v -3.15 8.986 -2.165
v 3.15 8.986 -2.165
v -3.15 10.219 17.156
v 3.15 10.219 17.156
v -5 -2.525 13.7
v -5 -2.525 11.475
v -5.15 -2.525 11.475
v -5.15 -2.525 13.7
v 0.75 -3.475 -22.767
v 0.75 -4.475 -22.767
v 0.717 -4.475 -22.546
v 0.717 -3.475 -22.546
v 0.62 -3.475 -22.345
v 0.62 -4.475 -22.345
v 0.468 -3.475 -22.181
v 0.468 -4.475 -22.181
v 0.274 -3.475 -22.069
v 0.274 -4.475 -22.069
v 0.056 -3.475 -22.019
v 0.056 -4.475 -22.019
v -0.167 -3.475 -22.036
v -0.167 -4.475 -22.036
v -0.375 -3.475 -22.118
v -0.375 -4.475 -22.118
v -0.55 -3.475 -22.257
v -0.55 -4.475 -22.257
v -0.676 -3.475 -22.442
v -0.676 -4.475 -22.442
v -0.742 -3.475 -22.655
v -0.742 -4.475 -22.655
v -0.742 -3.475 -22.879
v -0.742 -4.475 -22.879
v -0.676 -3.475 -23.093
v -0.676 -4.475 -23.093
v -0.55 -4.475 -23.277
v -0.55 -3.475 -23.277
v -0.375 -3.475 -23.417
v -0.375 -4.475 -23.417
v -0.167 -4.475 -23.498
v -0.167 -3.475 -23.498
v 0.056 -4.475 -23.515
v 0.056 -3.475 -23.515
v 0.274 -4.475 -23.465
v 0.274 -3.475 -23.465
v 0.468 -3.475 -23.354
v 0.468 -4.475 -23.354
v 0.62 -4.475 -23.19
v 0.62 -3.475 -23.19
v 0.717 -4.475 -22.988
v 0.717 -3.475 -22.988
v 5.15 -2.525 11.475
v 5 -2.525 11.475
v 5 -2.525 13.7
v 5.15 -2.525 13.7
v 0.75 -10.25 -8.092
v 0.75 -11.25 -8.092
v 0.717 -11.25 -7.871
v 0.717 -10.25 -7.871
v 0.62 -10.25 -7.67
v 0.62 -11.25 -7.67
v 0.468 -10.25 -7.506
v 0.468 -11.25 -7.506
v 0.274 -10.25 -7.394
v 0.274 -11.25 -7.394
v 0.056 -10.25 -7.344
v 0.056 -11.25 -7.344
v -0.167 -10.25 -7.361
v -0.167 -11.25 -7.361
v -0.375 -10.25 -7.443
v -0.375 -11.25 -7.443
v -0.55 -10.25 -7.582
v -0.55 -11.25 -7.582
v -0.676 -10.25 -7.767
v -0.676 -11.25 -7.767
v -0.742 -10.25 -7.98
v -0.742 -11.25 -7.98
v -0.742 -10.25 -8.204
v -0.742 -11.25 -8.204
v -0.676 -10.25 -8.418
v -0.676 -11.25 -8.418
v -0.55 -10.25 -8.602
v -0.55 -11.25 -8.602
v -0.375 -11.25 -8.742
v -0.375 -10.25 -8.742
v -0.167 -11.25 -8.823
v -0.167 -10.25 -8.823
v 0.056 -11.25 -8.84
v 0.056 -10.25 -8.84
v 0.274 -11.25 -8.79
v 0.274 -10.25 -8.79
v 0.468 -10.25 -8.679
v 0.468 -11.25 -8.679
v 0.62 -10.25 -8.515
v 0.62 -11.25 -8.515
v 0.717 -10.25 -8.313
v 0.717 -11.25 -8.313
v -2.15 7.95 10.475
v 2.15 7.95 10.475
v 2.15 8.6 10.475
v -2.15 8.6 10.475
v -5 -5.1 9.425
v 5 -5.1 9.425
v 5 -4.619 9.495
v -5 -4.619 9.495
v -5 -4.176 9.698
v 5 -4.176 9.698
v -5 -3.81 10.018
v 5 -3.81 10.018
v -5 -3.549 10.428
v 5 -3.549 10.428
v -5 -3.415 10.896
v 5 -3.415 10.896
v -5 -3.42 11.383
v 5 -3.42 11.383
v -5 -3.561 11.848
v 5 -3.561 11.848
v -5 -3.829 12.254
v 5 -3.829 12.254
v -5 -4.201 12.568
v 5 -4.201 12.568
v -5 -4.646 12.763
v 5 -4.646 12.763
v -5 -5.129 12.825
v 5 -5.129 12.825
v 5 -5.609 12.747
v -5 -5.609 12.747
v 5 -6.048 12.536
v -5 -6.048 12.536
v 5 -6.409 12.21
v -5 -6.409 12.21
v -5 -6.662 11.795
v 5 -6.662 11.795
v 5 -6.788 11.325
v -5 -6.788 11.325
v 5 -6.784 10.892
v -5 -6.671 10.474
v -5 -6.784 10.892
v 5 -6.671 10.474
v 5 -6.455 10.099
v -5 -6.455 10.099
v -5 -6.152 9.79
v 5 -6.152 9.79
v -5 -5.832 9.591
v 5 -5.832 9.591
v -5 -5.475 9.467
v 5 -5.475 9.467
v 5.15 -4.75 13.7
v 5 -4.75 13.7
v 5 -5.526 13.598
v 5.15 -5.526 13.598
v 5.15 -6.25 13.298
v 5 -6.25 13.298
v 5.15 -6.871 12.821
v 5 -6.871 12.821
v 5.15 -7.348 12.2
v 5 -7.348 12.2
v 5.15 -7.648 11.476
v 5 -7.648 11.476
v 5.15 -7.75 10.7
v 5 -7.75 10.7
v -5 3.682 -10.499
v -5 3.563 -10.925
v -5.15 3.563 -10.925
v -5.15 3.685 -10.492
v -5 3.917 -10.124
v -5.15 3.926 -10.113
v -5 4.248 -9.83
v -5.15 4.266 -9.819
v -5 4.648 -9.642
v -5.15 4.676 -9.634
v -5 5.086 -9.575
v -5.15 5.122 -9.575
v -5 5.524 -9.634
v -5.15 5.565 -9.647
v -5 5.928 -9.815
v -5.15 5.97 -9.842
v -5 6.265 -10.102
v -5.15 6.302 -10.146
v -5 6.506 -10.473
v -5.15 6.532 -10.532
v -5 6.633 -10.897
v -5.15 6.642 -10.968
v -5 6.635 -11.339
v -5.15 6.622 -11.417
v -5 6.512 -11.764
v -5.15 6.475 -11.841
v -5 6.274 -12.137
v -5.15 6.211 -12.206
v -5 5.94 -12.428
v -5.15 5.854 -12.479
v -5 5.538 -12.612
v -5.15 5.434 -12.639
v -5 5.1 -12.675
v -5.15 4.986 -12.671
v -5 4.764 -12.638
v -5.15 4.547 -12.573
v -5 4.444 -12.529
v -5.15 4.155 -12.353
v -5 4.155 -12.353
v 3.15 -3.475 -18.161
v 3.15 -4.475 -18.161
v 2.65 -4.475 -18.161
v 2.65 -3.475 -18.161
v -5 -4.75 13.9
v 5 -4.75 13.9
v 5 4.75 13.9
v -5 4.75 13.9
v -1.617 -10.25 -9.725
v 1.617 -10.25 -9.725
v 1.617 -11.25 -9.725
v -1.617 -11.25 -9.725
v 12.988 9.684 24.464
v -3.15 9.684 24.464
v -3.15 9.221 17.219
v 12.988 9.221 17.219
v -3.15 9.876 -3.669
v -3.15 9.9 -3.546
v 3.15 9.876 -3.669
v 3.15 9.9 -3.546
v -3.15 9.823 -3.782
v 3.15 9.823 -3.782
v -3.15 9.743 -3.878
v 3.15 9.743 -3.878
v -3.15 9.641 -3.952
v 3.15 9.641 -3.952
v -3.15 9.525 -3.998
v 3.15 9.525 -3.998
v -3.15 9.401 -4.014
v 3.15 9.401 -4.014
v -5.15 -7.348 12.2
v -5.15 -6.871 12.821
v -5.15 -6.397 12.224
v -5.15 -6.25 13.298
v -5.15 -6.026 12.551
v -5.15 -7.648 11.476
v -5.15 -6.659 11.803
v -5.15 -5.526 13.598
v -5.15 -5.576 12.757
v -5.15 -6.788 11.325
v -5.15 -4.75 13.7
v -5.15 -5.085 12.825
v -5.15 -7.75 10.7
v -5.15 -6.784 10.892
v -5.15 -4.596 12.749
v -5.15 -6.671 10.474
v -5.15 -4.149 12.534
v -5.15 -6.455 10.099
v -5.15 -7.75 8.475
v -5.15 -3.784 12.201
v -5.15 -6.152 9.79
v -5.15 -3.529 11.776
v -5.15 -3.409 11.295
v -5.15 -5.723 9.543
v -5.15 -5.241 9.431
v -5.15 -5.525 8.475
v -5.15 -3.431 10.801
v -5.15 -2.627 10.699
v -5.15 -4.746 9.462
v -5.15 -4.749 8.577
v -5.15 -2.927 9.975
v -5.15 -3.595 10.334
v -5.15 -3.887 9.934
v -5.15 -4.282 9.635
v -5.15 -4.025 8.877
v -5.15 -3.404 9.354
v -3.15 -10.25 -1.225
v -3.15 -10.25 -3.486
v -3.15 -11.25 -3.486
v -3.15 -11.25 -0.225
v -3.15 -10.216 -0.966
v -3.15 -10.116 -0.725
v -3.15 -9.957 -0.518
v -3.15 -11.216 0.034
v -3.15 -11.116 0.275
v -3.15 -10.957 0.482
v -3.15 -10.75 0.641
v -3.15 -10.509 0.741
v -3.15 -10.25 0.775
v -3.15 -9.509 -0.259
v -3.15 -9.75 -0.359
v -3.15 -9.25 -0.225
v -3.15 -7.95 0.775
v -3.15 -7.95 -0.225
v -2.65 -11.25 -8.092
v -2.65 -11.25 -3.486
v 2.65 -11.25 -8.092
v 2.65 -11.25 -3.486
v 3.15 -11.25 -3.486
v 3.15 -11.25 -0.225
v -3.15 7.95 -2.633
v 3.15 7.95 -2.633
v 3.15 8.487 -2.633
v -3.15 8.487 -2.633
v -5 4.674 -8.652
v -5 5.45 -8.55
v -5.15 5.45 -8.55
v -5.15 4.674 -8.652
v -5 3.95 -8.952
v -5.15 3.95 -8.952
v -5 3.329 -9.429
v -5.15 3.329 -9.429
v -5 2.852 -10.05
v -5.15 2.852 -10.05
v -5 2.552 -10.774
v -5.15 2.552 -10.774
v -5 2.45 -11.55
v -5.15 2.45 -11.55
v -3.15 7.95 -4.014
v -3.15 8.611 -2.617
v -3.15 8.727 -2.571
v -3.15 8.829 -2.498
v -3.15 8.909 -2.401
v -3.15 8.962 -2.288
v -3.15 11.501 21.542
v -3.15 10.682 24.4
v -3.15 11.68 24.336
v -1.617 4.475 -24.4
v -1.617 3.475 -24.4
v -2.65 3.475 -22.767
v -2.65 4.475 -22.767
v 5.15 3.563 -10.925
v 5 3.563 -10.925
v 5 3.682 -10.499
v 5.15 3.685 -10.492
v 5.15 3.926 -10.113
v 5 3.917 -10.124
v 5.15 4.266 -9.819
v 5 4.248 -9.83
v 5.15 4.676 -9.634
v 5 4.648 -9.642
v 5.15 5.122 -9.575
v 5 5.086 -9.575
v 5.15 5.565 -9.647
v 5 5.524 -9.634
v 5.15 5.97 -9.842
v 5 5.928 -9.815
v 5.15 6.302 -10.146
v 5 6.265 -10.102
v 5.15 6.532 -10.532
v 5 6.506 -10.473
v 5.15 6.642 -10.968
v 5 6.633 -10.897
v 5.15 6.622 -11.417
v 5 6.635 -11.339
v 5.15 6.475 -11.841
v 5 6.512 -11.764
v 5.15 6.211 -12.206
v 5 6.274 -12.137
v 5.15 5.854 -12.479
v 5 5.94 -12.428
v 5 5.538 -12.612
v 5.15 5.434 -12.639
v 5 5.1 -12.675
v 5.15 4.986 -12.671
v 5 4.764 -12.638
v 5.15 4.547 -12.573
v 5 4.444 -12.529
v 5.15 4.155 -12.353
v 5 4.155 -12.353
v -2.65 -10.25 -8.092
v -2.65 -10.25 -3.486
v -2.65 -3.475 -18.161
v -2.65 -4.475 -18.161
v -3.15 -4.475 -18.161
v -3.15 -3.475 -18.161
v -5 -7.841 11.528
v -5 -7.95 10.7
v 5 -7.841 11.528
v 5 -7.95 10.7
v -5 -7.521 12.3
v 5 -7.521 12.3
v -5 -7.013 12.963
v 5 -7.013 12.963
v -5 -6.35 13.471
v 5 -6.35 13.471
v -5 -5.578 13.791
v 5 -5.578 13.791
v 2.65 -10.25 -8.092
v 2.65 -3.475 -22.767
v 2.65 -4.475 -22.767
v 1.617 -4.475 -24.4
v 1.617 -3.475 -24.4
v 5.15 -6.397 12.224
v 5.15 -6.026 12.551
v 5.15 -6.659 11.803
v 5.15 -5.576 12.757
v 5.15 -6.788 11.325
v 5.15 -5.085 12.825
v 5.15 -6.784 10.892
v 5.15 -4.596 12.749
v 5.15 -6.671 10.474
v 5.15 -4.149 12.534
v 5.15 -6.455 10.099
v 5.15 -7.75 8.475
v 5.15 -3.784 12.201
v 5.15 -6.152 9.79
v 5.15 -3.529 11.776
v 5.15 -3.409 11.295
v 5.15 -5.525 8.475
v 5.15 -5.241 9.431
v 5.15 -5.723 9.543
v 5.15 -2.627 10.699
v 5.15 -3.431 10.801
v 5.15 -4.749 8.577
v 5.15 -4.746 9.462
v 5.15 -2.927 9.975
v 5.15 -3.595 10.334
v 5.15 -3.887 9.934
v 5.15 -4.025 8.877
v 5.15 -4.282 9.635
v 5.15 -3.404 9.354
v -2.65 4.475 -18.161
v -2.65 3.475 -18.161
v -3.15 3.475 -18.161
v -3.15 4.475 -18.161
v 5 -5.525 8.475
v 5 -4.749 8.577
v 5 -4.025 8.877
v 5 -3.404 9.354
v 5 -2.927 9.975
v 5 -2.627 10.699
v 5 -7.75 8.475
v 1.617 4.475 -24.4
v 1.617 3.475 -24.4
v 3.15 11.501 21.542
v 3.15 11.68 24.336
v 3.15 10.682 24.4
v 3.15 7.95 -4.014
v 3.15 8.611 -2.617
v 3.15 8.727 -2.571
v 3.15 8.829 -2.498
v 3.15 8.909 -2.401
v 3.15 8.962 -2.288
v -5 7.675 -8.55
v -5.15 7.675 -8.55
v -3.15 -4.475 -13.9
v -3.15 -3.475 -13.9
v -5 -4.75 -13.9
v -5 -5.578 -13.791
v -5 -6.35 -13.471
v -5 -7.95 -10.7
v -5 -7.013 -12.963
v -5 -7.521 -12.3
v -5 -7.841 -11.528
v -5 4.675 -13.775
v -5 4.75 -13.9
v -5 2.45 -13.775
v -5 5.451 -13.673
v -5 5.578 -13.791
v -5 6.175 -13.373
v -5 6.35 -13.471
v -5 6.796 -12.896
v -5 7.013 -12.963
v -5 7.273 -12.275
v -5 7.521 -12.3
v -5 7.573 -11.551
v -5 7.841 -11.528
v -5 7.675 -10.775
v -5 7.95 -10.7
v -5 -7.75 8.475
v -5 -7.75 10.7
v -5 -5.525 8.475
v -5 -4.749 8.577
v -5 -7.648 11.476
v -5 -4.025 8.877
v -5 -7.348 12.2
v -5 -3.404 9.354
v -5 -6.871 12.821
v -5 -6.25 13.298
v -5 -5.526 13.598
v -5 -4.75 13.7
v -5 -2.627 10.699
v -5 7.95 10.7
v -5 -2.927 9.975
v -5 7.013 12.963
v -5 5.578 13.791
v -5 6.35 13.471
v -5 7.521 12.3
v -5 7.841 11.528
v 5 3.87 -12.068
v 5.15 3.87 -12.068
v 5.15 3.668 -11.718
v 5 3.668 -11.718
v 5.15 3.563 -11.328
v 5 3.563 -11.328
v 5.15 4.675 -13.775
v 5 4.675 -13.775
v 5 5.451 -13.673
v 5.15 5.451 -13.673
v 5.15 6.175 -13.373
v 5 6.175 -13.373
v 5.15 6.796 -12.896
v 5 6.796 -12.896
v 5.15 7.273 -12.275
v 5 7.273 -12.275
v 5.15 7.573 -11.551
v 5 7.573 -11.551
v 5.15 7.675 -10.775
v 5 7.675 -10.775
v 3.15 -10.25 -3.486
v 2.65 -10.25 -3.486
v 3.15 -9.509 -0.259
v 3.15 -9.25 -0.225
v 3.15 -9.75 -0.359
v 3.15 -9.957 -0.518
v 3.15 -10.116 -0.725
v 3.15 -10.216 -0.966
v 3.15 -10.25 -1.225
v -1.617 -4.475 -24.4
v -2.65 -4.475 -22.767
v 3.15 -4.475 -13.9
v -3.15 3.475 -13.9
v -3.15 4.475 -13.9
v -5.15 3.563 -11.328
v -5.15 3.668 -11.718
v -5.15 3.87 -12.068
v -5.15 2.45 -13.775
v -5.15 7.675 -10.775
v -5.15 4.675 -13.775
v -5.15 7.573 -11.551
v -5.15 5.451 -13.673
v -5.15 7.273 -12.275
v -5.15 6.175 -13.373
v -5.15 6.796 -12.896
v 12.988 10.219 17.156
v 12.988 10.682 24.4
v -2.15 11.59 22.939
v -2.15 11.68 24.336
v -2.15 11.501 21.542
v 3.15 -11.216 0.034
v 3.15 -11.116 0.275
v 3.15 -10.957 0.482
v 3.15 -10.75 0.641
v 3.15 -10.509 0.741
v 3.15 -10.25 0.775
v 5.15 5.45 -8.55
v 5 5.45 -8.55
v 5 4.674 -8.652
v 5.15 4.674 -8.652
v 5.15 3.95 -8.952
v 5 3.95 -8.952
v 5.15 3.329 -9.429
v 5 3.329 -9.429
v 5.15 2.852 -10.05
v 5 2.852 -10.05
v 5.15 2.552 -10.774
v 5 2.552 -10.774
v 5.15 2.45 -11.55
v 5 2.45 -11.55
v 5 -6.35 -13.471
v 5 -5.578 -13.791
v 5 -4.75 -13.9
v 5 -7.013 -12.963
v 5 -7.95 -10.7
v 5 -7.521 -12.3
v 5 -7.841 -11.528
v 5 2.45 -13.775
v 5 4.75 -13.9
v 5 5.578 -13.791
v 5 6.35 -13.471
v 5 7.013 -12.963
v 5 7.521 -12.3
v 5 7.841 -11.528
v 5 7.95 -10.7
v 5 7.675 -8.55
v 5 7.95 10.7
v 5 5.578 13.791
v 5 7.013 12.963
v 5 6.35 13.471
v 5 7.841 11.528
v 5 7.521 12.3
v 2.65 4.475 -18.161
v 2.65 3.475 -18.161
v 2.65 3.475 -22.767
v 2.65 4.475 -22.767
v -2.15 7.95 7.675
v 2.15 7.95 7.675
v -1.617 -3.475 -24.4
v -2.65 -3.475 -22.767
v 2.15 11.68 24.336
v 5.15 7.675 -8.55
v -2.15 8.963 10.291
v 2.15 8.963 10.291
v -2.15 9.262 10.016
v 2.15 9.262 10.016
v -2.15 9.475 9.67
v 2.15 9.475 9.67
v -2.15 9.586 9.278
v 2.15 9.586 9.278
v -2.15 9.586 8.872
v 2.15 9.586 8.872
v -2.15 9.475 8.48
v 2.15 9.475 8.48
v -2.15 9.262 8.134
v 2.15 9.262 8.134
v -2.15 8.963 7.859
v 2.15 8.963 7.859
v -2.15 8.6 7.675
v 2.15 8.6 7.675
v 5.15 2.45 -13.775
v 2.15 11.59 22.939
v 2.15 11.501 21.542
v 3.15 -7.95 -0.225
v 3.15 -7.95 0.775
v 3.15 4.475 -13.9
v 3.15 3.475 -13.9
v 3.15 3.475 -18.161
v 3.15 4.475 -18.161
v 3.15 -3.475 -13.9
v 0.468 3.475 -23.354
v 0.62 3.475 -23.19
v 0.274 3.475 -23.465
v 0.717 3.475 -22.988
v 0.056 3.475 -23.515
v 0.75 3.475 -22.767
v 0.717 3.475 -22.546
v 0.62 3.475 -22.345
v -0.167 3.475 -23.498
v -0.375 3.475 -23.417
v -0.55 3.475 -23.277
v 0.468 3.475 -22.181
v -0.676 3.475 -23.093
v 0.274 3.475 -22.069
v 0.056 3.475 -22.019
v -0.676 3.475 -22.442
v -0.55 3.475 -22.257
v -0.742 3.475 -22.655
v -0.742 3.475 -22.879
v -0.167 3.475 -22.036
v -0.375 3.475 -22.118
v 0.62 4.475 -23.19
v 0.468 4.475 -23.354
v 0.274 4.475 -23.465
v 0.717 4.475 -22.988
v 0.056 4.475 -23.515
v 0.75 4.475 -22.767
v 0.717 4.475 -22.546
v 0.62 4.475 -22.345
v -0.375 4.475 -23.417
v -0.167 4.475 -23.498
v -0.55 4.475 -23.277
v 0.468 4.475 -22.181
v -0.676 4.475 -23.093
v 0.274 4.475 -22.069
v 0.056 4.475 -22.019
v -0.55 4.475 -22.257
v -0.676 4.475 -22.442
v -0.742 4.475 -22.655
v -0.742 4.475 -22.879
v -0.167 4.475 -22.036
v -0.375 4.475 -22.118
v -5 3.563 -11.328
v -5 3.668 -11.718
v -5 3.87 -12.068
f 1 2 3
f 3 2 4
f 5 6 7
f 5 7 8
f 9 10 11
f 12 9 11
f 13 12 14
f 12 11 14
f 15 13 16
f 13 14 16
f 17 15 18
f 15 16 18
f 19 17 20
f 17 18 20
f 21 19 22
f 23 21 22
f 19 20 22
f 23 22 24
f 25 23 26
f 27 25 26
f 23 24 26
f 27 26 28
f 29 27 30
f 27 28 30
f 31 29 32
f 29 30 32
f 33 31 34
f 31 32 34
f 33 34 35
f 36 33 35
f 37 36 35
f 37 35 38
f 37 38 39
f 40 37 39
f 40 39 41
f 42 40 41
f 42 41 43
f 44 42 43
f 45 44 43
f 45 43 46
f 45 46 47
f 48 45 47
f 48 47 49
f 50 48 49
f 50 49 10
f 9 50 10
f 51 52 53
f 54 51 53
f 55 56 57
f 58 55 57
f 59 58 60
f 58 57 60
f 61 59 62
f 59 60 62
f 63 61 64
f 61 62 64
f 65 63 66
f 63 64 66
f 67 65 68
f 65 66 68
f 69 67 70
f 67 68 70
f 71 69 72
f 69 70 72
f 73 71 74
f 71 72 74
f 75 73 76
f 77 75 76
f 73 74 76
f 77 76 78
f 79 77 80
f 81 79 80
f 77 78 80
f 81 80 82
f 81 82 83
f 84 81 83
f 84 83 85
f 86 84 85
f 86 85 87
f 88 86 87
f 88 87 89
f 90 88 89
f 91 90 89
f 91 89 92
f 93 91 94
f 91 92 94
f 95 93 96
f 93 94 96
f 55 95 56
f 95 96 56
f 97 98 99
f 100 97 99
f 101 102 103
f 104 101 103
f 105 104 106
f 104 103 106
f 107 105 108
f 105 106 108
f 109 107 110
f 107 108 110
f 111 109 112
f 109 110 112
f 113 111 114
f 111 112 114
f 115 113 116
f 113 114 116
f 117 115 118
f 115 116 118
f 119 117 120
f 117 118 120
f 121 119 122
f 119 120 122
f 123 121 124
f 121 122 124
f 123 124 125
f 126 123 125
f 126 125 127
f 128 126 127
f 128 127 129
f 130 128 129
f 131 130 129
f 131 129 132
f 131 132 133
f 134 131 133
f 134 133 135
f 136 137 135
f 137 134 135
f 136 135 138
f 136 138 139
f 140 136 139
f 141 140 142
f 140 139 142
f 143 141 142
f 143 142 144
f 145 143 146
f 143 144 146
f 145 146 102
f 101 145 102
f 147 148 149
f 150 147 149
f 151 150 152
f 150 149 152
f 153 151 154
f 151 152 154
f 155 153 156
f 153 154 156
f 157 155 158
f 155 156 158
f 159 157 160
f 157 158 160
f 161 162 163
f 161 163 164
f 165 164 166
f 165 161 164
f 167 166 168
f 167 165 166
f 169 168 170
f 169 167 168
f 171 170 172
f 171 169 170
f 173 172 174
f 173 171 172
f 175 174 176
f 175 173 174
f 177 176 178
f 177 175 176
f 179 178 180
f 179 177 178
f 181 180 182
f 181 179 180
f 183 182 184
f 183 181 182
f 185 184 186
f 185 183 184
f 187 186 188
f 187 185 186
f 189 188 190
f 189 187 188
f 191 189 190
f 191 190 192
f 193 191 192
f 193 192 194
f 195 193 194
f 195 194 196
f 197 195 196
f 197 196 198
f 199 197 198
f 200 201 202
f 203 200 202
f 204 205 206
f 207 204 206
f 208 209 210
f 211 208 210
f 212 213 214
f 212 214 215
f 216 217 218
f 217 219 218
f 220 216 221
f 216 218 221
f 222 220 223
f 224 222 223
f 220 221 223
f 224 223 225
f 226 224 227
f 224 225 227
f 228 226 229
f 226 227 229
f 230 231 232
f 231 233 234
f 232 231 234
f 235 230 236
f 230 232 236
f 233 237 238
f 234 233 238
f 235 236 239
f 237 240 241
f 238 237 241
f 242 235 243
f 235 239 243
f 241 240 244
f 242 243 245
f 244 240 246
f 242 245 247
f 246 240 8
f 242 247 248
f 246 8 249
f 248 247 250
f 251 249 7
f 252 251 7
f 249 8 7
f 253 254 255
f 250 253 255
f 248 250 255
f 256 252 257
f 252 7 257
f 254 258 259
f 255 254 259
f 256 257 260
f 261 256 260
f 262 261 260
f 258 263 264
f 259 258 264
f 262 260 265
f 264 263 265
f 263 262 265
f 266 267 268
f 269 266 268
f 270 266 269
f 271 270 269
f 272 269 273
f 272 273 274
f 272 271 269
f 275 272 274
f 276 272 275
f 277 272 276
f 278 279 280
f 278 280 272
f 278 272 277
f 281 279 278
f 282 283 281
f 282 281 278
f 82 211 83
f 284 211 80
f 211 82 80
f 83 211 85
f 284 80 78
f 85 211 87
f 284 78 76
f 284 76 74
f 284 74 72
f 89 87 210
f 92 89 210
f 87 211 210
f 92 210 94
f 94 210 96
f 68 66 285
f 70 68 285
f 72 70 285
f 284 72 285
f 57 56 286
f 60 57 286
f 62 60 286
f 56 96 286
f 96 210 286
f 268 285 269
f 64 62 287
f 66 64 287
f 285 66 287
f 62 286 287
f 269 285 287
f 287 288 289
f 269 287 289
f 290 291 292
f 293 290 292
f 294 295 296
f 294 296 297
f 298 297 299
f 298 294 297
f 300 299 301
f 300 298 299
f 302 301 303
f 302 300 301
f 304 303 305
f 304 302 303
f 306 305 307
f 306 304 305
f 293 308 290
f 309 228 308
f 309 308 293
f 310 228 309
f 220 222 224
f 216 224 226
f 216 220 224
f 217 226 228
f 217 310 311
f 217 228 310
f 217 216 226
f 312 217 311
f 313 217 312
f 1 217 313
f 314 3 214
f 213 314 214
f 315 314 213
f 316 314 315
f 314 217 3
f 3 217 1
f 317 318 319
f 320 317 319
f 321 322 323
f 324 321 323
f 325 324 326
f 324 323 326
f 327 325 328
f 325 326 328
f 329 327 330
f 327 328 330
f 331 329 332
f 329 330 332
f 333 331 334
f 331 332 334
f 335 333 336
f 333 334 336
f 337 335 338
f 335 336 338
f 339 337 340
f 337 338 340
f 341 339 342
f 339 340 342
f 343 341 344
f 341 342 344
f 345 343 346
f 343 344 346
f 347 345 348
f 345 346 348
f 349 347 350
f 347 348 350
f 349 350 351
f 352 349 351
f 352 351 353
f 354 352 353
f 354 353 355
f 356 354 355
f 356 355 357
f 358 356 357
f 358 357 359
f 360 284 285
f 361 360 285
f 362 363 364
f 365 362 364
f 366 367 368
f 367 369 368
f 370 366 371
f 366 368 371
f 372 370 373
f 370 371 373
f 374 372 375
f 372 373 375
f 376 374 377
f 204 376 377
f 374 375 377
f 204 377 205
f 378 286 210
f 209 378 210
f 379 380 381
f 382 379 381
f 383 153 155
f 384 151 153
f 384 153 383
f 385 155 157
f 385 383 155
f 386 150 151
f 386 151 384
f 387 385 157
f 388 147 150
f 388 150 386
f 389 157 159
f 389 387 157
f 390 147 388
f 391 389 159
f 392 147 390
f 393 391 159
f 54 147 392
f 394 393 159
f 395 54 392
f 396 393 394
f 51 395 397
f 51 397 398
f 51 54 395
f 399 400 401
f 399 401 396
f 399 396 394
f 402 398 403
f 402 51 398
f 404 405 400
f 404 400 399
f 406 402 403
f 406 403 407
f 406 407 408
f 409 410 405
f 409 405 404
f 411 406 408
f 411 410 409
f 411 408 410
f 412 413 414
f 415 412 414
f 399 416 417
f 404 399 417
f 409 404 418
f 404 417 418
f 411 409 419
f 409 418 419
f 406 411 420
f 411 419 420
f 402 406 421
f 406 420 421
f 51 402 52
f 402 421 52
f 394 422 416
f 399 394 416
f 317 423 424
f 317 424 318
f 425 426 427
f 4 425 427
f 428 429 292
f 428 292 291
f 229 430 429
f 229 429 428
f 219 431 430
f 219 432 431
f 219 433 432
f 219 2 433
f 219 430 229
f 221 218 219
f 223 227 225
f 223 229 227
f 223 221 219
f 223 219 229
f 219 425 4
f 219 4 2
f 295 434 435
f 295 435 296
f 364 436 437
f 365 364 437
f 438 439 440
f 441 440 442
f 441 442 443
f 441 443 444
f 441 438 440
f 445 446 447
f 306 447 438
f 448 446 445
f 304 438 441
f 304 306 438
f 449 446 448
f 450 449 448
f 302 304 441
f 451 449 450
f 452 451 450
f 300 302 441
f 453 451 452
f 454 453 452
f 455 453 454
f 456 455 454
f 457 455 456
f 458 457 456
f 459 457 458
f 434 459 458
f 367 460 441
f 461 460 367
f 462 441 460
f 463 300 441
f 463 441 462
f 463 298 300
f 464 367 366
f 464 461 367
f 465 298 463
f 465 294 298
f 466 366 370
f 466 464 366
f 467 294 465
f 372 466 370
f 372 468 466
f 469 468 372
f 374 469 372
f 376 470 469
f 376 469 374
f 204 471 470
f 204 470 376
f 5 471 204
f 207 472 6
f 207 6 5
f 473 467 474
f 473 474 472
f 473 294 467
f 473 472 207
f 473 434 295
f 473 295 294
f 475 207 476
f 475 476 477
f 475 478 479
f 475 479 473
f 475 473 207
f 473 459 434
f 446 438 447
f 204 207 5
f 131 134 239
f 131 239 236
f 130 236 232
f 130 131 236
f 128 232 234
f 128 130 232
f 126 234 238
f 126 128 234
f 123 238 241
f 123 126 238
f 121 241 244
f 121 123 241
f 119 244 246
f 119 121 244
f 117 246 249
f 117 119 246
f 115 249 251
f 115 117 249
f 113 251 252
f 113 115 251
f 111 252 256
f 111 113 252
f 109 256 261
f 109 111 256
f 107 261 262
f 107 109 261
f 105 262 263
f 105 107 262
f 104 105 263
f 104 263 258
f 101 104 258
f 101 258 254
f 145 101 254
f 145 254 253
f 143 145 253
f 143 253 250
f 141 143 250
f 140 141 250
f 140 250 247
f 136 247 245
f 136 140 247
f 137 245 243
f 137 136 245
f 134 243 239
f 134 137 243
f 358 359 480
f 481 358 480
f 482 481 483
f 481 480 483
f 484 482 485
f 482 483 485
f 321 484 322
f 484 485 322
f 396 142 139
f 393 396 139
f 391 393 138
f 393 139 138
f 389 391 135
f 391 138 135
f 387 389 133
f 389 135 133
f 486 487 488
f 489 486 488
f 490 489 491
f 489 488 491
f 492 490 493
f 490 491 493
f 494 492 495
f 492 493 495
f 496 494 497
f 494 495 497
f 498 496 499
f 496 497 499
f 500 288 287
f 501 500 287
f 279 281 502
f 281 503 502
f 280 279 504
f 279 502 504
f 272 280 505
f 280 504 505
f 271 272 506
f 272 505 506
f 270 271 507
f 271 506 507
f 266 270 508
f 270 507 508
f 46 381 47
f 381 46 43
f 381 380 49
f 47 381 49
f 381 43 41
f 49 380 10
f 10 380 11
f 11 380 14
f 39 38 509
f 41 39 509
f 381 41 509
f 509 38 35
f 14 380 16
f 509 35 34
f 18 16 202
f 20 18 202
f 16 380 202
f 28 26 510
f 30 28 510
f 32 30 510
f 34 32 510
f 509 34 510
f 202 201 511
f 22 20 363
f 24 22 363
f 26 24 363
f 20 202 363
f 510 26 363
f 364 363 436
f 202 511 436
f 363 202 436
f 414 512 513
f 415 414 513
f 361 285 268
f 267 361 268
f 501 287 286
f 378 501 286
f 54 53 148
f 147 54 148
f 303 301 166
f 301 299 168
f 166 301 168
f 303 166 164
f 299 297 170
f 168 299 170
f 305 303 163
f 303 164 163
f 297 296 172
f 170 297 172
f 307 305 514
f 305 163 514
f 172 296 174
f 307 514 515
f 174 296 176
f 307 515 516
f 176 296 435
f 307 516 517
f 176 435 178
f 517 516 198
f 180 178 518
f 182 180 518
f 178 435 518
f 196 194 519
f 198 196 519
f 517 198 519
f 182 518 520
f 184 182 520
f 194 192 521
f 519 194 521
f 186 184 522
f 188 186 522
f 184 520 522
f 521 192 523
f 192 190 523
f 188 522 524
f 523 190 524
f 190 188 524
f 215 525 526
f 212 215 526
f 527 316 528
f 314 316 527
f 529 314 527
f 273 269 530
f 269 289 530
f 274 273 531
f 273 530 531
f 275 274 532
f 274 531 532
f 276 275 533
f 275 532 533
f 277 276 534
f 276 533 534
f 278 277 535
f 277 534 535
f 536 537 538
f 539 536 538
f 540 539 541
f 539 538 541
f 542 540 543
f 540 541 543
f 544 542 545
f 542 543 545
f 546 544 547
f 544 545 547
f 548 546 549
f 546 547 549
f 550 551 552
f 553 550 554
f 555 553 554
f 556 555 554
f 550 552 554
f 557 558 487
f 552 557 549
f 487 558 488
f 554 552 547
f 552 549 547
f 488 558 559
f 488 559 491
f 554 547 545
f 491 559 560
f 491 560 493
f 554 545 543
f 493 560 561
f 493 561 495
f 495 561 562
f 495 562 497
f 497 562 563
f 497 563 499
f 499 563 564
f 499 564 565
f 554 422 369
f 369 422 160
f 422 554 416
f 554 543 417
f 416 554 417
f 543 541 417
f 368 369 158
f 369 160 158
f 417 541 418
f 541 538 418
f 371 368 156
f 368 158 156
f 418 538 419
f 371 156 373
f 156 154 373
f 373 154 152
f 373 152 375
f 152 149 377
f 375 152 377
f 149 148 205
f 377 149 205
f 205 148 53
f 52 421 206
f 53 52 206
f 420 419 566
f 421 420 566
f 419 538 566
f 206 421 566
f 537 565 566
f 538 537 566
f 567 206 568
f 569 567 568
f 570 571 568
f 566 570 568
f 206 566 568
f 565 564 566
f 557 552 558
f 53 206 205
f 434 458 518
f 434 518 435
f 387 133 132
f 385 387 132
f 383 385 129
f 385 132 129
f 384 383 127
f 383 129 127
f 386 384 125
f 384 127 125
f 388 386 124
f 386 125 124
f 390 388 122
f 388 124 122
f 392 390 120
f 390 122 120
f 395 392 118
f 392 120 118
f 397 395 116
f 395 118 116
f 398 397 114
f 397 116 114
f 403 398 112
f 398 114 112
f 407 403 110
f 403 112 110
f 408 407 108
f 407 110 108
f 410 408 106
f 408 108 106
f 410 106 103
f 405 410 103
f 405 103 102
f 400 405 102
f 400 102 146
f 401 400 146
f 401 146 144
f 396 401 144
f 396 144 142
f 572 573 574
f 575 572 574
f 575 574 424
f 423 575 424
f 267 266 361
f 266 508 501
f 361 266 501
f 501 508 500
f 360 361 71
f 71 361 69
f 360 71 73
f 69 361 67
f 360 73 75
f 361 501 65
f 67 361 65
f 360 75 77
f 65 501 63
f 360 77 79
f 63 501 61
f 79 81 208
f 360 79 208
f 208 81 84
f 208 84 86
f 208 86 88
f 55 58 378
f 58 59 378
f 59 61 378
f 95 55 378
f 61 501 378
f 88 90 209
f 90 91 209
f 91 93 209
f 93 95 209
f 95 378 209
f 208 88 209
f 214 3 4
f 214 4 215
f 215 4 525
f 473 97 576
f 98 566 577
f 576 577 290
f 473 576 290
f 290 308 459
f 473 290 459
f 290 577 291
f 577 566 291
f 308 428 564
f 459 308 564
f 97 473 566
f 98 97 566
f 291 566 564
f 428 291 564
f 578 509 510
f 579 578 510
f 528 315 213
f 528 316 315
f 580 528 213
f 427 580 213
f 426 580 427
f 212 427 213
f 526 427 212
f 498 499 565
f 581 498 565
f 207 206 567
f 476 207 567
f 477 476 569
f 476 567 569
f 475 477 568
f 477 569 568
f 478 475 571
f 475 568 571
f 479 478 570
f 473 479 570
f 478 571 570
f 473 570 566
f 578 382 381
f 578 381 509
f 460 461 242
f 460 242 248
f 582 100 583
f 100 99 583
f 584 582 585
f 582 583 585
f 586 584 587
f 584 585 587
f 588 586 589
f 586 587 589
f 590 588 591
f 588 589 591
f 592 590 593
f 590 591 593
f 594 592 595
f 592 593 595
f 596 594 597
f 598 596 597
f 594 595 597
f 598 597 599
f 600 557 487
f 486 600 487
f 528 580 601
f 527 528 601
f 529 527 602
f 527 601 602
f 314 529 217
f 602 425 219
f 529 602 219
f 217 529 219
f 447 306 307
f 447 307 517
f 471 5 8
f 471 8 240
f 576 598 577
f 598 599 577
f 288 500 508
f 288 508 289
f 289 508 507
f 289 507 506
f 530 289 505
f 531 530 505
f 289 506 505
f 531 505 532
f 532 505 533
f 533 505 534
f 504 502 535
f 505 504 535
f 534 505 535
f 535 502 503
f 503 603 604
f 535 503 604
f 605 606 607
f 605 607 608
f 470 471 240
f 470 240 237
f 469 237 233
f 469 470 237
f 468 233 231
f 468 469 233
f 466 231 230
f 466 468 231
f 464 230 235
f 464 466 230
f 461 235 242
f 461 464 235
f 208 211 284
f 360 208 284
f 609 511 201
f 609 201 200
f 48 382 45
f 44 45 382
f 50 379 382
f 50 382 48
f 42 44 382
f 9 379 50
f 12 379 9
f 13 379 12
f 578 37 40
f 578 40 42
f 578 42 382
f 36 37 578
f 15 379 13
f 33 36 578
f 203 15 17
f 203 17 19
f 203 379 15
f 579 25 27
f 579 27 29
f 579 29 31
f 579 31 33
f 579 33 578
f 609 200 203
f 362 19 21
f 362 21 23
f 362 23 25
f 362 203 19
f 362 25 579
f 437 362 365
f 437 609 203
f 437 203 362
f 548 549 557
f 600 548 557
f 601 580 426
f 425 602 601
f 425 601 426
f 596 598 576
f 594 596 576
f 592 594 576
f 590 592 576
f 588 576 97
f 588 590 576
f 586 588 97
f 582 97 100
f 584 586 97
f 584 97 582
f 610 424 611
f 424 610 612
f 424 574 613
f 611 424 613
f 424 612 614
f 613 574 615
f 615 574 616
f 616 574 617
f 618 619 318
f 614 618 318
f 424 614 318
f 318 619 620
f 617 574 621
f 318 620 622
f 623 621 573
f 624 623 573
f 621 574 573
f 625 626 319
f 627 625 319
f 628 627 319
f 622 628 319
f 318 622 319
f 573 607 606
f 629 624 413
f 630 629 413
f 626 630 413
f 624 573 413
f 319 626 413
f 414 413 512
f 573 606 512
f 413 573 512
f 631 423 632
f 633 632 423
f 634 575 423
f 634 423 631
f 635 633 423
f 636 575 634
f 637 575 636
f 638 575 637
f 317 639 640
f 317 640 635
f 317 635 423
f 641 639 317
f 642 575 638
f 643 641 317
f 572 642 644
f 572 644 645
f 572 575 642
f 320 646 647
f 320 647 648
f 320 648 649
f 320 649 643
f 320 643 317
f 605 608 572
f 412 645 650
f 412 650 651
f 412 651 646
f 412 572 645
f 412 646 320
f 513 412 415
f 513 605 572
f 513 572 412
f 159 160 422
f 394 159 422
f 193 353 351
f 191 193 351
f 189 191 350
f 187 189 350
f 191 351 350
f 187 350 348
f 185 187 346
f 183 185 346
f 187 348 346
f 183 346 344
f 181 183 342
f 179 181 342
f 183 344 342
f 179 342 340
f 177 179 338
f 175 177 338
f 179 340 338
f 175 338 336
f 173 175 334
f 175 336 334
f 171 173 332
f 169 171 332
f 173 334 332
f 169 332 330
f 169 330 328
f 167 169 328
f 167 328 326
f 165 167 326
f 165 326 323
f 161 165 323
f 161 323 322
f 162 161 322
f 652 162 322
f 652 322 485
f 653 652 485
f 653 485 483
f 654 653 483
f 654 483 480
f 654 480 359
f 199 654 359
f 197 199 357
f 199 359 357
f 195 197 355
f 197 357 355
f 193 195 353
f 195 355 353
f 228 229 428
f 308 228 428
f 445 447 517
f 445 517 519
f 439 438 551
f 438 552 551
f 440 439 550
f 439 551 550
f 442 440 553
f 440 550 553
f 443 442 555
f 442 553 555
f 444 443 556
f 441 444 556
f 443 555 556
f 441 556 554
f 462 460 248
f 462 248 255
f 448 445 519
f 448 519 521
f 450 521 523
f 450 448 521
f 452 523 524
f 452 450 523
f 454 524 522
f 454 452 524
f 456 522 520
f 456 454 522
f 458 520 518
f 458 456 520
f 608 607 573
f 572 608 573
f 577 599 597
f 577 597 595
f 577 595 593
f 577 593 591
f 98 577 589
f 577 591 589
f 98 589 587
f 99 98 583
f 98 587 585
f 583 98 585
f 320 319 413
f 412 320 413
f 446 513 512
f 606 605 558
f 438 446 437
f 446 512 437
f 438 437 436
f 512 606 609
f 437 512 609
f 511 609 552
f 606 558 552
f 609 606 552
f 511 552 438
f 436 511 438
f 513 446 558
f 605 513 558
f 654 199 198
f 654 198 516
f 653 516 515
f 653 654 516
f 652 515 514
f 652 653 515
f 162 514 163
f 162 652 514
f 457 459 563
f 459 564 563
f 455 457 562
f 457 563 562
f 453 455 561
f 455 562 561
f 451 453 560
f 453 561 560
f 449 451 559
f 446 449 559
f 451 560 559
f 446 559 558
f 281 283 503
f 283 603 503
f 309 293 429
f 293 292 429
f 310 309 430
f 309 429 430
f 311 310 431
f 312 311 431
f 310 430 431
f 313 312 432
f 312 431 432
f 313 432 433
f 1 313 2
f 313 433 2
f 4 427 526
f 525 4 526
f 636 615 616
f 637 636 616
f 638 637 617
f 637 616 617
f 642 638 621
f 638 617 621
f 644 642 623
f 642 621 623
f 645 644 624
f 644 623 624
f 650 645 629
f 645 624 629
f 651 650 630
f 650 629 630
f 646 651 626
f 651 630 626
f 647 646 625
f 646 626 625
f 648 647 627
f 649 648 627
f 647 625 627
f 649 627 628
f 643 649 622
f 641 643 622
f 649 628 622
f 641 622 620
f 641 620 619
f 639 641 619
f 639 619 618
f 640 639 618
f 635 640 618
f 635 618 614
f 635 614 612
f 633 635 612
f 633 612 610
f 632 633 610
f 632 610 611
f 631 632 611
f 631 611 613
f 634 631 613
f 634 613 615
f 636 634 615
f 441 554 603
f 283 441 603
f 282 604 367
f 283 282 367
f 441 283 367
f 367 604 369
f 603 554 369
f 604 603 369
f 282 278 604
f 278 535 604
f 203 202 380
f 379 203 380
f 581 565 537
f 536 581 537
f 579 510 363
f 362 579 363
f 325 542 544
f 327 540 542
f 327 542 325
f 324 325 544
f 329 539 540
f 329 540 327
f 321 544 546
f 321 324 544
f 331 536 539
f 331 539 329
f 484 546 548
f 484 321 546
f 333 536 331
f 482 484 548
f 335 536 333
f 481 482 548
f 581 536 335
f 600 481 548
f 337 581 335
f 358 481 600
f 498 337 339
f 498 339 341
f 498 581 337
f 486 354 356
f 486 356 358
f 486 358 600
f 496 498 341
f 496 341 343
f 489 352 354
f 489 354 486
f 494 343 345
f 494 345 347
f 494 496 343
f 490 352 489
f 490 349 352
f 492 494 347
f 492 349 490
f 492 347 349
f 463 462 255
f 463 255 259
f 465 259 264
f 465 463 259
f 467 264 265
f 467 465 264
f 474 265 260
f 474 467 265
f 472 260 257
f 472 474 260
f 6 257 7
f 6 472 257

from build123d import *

# Parameters (mm, degrees)
BLOCOBASE_DEPTH           = 5
SKFIXACAO_R               = 1.7
SKFIXACAO_R_2             = 1.55
FIXACAO_DEPTH             = 5.15
RESSALTOFIXACAO_DEPTH     = 0.15
BOTAO_DEPTH               = 2.15
SKETCH5_W                 = 6.3
SKETCH5_H                 = 1
BASECONECTORNONC_DEPTH    = 10.5
SKDESENHOCONECTORNONC_R   = 0.75
DESENHOCONECTORNONC_DEPTH = 20.5
BASECONECTORCOM_DEPTH     = 3.15
SKDESENHOCONECTORCOM_R    = 0.75
DESENHOCONECTORCOM_DEPTH  = 1
BASECONTATO_DEPTH         = 3.15
SKAPOIOROLO_R             = 0.7
APOIOROLO_DEPTH           = 1
SKROLO_R                  = 2.5
ROLO_DEPTH                = 4.3
SKETCH6_W                 = 15.037683952
SKETCH6_H                 = 10.848275608
CUT_EXTRUDE1_DEPTH        = 10
SKETCH7_W                 = 16.137668404
SKETCH7_H                 = 7.258990492
BOSS_EXTRUDE1_DEPTH       = 1


with BuildPart() as part:
    # skBlocoBase → BlocoBase (new body, symmetric)
    with BuildSketch(Plane(origin=(0, 0, 0), x_dir=(0, 0, -1), z_dir=(1, 0, 0))):
        with BuildLine():
            Line((-10.7, 7.95), (10.7, 7.95))
            ThreePointArc((10.7, 7.95), (12.9627417, 7.0127417), (13.9, 4.75))
            Line((13.9, 4.75), (13.9, -4.75))
            ThreePointArc((13.9, -4.75), (12.9627417, -7.0127417), (10.7, -7.95))
            Line((10.7, -7.95), (-10.7, -7.95))
            ThreePointArc((-10.7, -7.95), (-12.9627417, -7.0127417), (-13.9, -4.75))
            Line((-13.9, -4.75), (-13.9, 4.75))
            ThreePointArc((-13.9, 4.75), (-12.9627417, 7.0127417), (-10.7, 7.95))
        make_face()
    extrude(amount=BLOCOBASE_DEPTH, both=True)

    # skFixacao → Fixacao (cut, symmetric)
    with BuildSketch(Plane(origin=(0, 0, 0), x_dir=(0, 0, -1), z_dir=(1, 0, 0))):
        with Locations((-11.125, -5.1)):
            Circle(SKFIXACAO_R)
        with Locations((11.125, 5.1)):
            Circle(SKFIXACAO_R_2)
    extrude(amount=FIXACAO_DEPTH, both=True, mode=Mode.SUBTRACT)

    # skRessaltoFixacao → RessaltoFixacao (add)
    with BuildSketch(Plane(origin=(5, 0, 0), x_dir=(0, 0, -1), z_dir=(1, 0, 0))):
        with BuildLine():
            ThreePointArc((-8.475, -5.525), (-9.353679656, -3.403679656), (-11.475, -2.525))
            Line((-11.475, -2.525), (-13.7, -2.525))
            Line((-13.7, -2.525), (-13.7, -4.75))
            ThreePointArc((-13.7, -4.75), (-12.821320344, -6.871320344), (-10.7, -7.75))
            Line((-10.7, -7.75), (-8.475, -7.75))
            Line((-8.475, -7.75), (-8.475, -5.525))
        make_face()
        with BuildLine():
            ThreePointArc((-9.789845005, -6.152312282), (-10.474438165, -6.670595205), (-11.325, -6.788194302))
            ThreePointArc((-11.325, -6.788194302), (-11.775561835, -3.529404795), (-9.789845005, -6.152312282))
        make_face(mode=Mode.SUBTRACT)
        with BuildLine():
            ThreePointArc((13.775, 4.675), (12.896320344, 6.796320344), (10.775, 7.675))
            Line((10.775, 7.675), (8.55, 7.675))
            Line((8.55, 7.675), (8.55, 5.45))
            ThreePointArc((8.55, 5.45), (9.428679656, 3.328679656), (11.55, 2.45))
            Line((11.55, 2.45), (13.775, 2.45))
            Line((13.775, 2.45), (13.775, 4.675))
        make_face()
        with BuildLine():
            ThreePointArc((12.353274612, 4.1545681), (11.71815932, 3.667986725), (10.925, 3.562957385))
            ThreePointArc((10.925, 3.562957385), (10.53184068, 6.532013275), (12.353274612, 4.1545681))
        make_face(mode=Mode.SUBTRACT)
    ressaltofixacao = extrude(amount=RESSALTOFIXACAO_DEPTH)

    # MirrorRessaltoFixacao: RessaltoFixacao across plane
    add(ressaltofixacao.mirror(Plane(origin=(0, 0, 0), x_dir=(0, 0, 1), z_dir=(1, 0, 0))))

    # skBotao → Botao (add, symmetric)
    with BuildSketch(Plane(origin=(0, 0, 0), x_dir=(0, 0, -1), z_dir=(1, 0, 0))):
        with BuildLine():
            Line((-10.475, 7.95), (-10.475, 8.6))
            ThreePointArc((-10.475, 8.6), (-9.075, 9.6), (-7.675, 8.6))
            Line((-7.675, 8.6), (-7.675, 7.95))
            Line((-7.675, 7.95), (-10.475, 7.95))
        make_face()
    extrude(amount=BOTAO_DEPTH, both=True)

    # Sketch5 → BaseConectorNONC (add)
    with BuildSketch(Plane(origin=(0, 0, -13.9), x_dir=(-1, 0, 0), z_dir=(0, 0, -1))):
        with Locations((0, -3.975)):
            Rectangle(SKETCH5_W, SKETCH5_H)
        with Locations((0, 3.975)):
            Rectangle(SKETCH5_W, SKETCH5_H)
    extrude(amount=BASECONECTORNONC_DEPTH)

    # skDesenhoConectorNONC → DesenhoConectorNONC (cut)
    with BuildSketch(Plane.XZ.offset(4.475)):
        Polygon((2.65, -22.767142952), (1.616967042, -24.4), (3.15, -24.4), (3.15, -18.161236833), (2.65, -18.161236833), align=None)
        Polygon((-3.15, -24.4), (-1.616967042, -24.4), (-2.65, -22.767142952), (-2.65, -18.161236833), (-3.15, -18.161236833), align=None)
        with Locations((0, -22.767142952)):
            Circle(SKDESENHOCONECTORNONC_R)
    extrude(amount=-DESENHOCONECTORNONC_DEPTH, mode=Mode.SUBTRACT)

    # skBaseConectorCOM → BaseConectorCOM (add, symmetric)
    with BuildSketch(Plane(origin=(0, 0, 0), x_dir=(0, 0, -1), z_dir=(1, 0, 0))):
        with BuildLine():
            Line((9.725, -11.25), (0.225, -11.25))
            ThreePointArc((0.225, -11.25), (-0.482106781, -10.957106781), (-0.775, -10.25))
            Line((-0.775, -10.25), (-0.775, -7.95))
            Line((-0.775, -7.95), (0.225, -7.95))
            Line((0.225, -7.95), (0.225, -9.25))
            ThreePointArc((0.225, -9.25), (0.517893219, -9.957106781), (1.225, -10.25))
            Line((1.225, -10.25), (9.725, -10.25))
            Line((9.725, -10.25), (9.725, -11.25))
        make_face()
    extrude(amount=BASECONECTORCOM_DEPTH, both=True)

    # skDesenhoConectorCOM → DesenhoConectorCOM (cut)
    with BuildSketch(Plane.XZ.offset(11.25)):
        Polygon((2.65, -8.092142952), (1.616967042, -9.725), (3.15, -9.725), (3.15, -3.486236833), (2.65, -3.486236833), align=None)
        Polygon((-3.15, -9.725), (-1.616967042, -9.725), (-2.65, -8.092142952), (-2.65, -3.486236833), (-3.15, -3.486236833), align=None)
        with Locations((0, -8.092142952)):
            Circle(SKDESENHOCONECTORCOM_R)
    extrude(amount=-DESENHOCONECTORCOM_DEPTH, mode=Mode.SUBTRACT)

    # skBaseContato → BaseContato (add, symmetric)
    with BuildSketch(Plane(origin=(0, 0, 0), x_dir=(0, 0, -1), z_dir=(1, 0, 0))):
        with BuildLine():
            Line((2.63302332, 7.95), (2.63302332, 8.486635004))
            ThreePointArc((2.63302332, 8.486635004), (2.497665983, 8.828739854), (2.164880406, 8.985619098))
            Line((2.164880406, 8.985619098), (-24.4, 10.681624431))
            Line((-24.4, 10.681624431), (-24.336285828, 11.679592619))
            Line((-24.336285828, 11.679592619), (3.545575005, 9.899506131))
            ThreePointArc((3.545575005, 9.899506131), (3.878360582, 9.742626887), (4.013717919, 9.400522037))
            Line((4.013717919, 9.400522037), (4.013717919, 7.95))
            Line((4.013717919, 7.95), (2.63302332, 7.95))
        make_face()
    extrude(amount=BASECONTATO_DEPTH, both=True)

    # skApoioRolo → ApoioRolo (add)
    with BuildSketch(Plane(origin=(3.15, 0, 0), x_dir=(0, 0, -1), z_dir=(1, 0, 0))):
        with BuildLine():
            ThreePointArc((-21.354211514, 14.486814776), (-22.754211514, 15.886814776), (-24.154211514, 14.486814776))
            Line((-24.154211514, 14.486814776), (-24.336285828, 11.679592619))
            Line((-24.336285828, 11.679592619), (-22.939130364, 11.590392778))
            Line((-22.939130364, 11.590392778), (-21.541974901, 11.501192936))
            Line((-21.541974901, 11.501192936), (-21.365242034, 14.3114187))
            Line((-21.365242034, 14.3114187), (-21.354211514, 14.486814776))
        make_face()
        with Locations((-22.754211514, 14.486814776)):
            Circle(SKAPOIOROLO_R, mode=Mode.SUBTRACT)
    apoiorolo = extrude(amount=-APOIOROLO_DEPTH)

    # MirrorApoioRolo: ApoioRolo across plane
    add(apoiorolo.mirror(Plane(origin=(0, 0, 0), x_dir=(0, 0, 1), z_dir=(1, 0, 0))))

    # skRolo → Rolo (add)
    with BuildSketch(Plane.ZY.offset(-2.15)):
        with Locations((22.754211514, 14.486814776)):
            Circle(SKROLO_R)
    extrude(amount=ROLO_DEPTH)

    # Sketch6 → Cut-Extrude1 (cut)
    with BuildSketch(Plane(origin=(0, 10.084763511, -0.643850544), x_dir=(1, 0, 0), z_dir=(0, 0.997968188, -0.063714172))):
        with Locations((-4.368841976, -23.671158356)):
            Rectangle(SKETCH6_W, SKETCH6_H)
    extrude(amount=CUT_EXTRUDE1_DEPTH, mode=Mode.SUBTRACT)

    # Sketch7 → Boss-Extrude1 (add)
    with BuildSketch(Plane(origin=(0, 9.086795323, -0.580136372), x_dir=(1, 0, 0), z_dir=(0, -0.997968188, 0.063714172))):
        with Locations((4.918834202, 21.401499401)):
            Rectangle(SKETCH7_W, SKETCH7_H)
    extrude(amount=BOSS_EXTRUDE1_DEPTH)


solid = part.part
